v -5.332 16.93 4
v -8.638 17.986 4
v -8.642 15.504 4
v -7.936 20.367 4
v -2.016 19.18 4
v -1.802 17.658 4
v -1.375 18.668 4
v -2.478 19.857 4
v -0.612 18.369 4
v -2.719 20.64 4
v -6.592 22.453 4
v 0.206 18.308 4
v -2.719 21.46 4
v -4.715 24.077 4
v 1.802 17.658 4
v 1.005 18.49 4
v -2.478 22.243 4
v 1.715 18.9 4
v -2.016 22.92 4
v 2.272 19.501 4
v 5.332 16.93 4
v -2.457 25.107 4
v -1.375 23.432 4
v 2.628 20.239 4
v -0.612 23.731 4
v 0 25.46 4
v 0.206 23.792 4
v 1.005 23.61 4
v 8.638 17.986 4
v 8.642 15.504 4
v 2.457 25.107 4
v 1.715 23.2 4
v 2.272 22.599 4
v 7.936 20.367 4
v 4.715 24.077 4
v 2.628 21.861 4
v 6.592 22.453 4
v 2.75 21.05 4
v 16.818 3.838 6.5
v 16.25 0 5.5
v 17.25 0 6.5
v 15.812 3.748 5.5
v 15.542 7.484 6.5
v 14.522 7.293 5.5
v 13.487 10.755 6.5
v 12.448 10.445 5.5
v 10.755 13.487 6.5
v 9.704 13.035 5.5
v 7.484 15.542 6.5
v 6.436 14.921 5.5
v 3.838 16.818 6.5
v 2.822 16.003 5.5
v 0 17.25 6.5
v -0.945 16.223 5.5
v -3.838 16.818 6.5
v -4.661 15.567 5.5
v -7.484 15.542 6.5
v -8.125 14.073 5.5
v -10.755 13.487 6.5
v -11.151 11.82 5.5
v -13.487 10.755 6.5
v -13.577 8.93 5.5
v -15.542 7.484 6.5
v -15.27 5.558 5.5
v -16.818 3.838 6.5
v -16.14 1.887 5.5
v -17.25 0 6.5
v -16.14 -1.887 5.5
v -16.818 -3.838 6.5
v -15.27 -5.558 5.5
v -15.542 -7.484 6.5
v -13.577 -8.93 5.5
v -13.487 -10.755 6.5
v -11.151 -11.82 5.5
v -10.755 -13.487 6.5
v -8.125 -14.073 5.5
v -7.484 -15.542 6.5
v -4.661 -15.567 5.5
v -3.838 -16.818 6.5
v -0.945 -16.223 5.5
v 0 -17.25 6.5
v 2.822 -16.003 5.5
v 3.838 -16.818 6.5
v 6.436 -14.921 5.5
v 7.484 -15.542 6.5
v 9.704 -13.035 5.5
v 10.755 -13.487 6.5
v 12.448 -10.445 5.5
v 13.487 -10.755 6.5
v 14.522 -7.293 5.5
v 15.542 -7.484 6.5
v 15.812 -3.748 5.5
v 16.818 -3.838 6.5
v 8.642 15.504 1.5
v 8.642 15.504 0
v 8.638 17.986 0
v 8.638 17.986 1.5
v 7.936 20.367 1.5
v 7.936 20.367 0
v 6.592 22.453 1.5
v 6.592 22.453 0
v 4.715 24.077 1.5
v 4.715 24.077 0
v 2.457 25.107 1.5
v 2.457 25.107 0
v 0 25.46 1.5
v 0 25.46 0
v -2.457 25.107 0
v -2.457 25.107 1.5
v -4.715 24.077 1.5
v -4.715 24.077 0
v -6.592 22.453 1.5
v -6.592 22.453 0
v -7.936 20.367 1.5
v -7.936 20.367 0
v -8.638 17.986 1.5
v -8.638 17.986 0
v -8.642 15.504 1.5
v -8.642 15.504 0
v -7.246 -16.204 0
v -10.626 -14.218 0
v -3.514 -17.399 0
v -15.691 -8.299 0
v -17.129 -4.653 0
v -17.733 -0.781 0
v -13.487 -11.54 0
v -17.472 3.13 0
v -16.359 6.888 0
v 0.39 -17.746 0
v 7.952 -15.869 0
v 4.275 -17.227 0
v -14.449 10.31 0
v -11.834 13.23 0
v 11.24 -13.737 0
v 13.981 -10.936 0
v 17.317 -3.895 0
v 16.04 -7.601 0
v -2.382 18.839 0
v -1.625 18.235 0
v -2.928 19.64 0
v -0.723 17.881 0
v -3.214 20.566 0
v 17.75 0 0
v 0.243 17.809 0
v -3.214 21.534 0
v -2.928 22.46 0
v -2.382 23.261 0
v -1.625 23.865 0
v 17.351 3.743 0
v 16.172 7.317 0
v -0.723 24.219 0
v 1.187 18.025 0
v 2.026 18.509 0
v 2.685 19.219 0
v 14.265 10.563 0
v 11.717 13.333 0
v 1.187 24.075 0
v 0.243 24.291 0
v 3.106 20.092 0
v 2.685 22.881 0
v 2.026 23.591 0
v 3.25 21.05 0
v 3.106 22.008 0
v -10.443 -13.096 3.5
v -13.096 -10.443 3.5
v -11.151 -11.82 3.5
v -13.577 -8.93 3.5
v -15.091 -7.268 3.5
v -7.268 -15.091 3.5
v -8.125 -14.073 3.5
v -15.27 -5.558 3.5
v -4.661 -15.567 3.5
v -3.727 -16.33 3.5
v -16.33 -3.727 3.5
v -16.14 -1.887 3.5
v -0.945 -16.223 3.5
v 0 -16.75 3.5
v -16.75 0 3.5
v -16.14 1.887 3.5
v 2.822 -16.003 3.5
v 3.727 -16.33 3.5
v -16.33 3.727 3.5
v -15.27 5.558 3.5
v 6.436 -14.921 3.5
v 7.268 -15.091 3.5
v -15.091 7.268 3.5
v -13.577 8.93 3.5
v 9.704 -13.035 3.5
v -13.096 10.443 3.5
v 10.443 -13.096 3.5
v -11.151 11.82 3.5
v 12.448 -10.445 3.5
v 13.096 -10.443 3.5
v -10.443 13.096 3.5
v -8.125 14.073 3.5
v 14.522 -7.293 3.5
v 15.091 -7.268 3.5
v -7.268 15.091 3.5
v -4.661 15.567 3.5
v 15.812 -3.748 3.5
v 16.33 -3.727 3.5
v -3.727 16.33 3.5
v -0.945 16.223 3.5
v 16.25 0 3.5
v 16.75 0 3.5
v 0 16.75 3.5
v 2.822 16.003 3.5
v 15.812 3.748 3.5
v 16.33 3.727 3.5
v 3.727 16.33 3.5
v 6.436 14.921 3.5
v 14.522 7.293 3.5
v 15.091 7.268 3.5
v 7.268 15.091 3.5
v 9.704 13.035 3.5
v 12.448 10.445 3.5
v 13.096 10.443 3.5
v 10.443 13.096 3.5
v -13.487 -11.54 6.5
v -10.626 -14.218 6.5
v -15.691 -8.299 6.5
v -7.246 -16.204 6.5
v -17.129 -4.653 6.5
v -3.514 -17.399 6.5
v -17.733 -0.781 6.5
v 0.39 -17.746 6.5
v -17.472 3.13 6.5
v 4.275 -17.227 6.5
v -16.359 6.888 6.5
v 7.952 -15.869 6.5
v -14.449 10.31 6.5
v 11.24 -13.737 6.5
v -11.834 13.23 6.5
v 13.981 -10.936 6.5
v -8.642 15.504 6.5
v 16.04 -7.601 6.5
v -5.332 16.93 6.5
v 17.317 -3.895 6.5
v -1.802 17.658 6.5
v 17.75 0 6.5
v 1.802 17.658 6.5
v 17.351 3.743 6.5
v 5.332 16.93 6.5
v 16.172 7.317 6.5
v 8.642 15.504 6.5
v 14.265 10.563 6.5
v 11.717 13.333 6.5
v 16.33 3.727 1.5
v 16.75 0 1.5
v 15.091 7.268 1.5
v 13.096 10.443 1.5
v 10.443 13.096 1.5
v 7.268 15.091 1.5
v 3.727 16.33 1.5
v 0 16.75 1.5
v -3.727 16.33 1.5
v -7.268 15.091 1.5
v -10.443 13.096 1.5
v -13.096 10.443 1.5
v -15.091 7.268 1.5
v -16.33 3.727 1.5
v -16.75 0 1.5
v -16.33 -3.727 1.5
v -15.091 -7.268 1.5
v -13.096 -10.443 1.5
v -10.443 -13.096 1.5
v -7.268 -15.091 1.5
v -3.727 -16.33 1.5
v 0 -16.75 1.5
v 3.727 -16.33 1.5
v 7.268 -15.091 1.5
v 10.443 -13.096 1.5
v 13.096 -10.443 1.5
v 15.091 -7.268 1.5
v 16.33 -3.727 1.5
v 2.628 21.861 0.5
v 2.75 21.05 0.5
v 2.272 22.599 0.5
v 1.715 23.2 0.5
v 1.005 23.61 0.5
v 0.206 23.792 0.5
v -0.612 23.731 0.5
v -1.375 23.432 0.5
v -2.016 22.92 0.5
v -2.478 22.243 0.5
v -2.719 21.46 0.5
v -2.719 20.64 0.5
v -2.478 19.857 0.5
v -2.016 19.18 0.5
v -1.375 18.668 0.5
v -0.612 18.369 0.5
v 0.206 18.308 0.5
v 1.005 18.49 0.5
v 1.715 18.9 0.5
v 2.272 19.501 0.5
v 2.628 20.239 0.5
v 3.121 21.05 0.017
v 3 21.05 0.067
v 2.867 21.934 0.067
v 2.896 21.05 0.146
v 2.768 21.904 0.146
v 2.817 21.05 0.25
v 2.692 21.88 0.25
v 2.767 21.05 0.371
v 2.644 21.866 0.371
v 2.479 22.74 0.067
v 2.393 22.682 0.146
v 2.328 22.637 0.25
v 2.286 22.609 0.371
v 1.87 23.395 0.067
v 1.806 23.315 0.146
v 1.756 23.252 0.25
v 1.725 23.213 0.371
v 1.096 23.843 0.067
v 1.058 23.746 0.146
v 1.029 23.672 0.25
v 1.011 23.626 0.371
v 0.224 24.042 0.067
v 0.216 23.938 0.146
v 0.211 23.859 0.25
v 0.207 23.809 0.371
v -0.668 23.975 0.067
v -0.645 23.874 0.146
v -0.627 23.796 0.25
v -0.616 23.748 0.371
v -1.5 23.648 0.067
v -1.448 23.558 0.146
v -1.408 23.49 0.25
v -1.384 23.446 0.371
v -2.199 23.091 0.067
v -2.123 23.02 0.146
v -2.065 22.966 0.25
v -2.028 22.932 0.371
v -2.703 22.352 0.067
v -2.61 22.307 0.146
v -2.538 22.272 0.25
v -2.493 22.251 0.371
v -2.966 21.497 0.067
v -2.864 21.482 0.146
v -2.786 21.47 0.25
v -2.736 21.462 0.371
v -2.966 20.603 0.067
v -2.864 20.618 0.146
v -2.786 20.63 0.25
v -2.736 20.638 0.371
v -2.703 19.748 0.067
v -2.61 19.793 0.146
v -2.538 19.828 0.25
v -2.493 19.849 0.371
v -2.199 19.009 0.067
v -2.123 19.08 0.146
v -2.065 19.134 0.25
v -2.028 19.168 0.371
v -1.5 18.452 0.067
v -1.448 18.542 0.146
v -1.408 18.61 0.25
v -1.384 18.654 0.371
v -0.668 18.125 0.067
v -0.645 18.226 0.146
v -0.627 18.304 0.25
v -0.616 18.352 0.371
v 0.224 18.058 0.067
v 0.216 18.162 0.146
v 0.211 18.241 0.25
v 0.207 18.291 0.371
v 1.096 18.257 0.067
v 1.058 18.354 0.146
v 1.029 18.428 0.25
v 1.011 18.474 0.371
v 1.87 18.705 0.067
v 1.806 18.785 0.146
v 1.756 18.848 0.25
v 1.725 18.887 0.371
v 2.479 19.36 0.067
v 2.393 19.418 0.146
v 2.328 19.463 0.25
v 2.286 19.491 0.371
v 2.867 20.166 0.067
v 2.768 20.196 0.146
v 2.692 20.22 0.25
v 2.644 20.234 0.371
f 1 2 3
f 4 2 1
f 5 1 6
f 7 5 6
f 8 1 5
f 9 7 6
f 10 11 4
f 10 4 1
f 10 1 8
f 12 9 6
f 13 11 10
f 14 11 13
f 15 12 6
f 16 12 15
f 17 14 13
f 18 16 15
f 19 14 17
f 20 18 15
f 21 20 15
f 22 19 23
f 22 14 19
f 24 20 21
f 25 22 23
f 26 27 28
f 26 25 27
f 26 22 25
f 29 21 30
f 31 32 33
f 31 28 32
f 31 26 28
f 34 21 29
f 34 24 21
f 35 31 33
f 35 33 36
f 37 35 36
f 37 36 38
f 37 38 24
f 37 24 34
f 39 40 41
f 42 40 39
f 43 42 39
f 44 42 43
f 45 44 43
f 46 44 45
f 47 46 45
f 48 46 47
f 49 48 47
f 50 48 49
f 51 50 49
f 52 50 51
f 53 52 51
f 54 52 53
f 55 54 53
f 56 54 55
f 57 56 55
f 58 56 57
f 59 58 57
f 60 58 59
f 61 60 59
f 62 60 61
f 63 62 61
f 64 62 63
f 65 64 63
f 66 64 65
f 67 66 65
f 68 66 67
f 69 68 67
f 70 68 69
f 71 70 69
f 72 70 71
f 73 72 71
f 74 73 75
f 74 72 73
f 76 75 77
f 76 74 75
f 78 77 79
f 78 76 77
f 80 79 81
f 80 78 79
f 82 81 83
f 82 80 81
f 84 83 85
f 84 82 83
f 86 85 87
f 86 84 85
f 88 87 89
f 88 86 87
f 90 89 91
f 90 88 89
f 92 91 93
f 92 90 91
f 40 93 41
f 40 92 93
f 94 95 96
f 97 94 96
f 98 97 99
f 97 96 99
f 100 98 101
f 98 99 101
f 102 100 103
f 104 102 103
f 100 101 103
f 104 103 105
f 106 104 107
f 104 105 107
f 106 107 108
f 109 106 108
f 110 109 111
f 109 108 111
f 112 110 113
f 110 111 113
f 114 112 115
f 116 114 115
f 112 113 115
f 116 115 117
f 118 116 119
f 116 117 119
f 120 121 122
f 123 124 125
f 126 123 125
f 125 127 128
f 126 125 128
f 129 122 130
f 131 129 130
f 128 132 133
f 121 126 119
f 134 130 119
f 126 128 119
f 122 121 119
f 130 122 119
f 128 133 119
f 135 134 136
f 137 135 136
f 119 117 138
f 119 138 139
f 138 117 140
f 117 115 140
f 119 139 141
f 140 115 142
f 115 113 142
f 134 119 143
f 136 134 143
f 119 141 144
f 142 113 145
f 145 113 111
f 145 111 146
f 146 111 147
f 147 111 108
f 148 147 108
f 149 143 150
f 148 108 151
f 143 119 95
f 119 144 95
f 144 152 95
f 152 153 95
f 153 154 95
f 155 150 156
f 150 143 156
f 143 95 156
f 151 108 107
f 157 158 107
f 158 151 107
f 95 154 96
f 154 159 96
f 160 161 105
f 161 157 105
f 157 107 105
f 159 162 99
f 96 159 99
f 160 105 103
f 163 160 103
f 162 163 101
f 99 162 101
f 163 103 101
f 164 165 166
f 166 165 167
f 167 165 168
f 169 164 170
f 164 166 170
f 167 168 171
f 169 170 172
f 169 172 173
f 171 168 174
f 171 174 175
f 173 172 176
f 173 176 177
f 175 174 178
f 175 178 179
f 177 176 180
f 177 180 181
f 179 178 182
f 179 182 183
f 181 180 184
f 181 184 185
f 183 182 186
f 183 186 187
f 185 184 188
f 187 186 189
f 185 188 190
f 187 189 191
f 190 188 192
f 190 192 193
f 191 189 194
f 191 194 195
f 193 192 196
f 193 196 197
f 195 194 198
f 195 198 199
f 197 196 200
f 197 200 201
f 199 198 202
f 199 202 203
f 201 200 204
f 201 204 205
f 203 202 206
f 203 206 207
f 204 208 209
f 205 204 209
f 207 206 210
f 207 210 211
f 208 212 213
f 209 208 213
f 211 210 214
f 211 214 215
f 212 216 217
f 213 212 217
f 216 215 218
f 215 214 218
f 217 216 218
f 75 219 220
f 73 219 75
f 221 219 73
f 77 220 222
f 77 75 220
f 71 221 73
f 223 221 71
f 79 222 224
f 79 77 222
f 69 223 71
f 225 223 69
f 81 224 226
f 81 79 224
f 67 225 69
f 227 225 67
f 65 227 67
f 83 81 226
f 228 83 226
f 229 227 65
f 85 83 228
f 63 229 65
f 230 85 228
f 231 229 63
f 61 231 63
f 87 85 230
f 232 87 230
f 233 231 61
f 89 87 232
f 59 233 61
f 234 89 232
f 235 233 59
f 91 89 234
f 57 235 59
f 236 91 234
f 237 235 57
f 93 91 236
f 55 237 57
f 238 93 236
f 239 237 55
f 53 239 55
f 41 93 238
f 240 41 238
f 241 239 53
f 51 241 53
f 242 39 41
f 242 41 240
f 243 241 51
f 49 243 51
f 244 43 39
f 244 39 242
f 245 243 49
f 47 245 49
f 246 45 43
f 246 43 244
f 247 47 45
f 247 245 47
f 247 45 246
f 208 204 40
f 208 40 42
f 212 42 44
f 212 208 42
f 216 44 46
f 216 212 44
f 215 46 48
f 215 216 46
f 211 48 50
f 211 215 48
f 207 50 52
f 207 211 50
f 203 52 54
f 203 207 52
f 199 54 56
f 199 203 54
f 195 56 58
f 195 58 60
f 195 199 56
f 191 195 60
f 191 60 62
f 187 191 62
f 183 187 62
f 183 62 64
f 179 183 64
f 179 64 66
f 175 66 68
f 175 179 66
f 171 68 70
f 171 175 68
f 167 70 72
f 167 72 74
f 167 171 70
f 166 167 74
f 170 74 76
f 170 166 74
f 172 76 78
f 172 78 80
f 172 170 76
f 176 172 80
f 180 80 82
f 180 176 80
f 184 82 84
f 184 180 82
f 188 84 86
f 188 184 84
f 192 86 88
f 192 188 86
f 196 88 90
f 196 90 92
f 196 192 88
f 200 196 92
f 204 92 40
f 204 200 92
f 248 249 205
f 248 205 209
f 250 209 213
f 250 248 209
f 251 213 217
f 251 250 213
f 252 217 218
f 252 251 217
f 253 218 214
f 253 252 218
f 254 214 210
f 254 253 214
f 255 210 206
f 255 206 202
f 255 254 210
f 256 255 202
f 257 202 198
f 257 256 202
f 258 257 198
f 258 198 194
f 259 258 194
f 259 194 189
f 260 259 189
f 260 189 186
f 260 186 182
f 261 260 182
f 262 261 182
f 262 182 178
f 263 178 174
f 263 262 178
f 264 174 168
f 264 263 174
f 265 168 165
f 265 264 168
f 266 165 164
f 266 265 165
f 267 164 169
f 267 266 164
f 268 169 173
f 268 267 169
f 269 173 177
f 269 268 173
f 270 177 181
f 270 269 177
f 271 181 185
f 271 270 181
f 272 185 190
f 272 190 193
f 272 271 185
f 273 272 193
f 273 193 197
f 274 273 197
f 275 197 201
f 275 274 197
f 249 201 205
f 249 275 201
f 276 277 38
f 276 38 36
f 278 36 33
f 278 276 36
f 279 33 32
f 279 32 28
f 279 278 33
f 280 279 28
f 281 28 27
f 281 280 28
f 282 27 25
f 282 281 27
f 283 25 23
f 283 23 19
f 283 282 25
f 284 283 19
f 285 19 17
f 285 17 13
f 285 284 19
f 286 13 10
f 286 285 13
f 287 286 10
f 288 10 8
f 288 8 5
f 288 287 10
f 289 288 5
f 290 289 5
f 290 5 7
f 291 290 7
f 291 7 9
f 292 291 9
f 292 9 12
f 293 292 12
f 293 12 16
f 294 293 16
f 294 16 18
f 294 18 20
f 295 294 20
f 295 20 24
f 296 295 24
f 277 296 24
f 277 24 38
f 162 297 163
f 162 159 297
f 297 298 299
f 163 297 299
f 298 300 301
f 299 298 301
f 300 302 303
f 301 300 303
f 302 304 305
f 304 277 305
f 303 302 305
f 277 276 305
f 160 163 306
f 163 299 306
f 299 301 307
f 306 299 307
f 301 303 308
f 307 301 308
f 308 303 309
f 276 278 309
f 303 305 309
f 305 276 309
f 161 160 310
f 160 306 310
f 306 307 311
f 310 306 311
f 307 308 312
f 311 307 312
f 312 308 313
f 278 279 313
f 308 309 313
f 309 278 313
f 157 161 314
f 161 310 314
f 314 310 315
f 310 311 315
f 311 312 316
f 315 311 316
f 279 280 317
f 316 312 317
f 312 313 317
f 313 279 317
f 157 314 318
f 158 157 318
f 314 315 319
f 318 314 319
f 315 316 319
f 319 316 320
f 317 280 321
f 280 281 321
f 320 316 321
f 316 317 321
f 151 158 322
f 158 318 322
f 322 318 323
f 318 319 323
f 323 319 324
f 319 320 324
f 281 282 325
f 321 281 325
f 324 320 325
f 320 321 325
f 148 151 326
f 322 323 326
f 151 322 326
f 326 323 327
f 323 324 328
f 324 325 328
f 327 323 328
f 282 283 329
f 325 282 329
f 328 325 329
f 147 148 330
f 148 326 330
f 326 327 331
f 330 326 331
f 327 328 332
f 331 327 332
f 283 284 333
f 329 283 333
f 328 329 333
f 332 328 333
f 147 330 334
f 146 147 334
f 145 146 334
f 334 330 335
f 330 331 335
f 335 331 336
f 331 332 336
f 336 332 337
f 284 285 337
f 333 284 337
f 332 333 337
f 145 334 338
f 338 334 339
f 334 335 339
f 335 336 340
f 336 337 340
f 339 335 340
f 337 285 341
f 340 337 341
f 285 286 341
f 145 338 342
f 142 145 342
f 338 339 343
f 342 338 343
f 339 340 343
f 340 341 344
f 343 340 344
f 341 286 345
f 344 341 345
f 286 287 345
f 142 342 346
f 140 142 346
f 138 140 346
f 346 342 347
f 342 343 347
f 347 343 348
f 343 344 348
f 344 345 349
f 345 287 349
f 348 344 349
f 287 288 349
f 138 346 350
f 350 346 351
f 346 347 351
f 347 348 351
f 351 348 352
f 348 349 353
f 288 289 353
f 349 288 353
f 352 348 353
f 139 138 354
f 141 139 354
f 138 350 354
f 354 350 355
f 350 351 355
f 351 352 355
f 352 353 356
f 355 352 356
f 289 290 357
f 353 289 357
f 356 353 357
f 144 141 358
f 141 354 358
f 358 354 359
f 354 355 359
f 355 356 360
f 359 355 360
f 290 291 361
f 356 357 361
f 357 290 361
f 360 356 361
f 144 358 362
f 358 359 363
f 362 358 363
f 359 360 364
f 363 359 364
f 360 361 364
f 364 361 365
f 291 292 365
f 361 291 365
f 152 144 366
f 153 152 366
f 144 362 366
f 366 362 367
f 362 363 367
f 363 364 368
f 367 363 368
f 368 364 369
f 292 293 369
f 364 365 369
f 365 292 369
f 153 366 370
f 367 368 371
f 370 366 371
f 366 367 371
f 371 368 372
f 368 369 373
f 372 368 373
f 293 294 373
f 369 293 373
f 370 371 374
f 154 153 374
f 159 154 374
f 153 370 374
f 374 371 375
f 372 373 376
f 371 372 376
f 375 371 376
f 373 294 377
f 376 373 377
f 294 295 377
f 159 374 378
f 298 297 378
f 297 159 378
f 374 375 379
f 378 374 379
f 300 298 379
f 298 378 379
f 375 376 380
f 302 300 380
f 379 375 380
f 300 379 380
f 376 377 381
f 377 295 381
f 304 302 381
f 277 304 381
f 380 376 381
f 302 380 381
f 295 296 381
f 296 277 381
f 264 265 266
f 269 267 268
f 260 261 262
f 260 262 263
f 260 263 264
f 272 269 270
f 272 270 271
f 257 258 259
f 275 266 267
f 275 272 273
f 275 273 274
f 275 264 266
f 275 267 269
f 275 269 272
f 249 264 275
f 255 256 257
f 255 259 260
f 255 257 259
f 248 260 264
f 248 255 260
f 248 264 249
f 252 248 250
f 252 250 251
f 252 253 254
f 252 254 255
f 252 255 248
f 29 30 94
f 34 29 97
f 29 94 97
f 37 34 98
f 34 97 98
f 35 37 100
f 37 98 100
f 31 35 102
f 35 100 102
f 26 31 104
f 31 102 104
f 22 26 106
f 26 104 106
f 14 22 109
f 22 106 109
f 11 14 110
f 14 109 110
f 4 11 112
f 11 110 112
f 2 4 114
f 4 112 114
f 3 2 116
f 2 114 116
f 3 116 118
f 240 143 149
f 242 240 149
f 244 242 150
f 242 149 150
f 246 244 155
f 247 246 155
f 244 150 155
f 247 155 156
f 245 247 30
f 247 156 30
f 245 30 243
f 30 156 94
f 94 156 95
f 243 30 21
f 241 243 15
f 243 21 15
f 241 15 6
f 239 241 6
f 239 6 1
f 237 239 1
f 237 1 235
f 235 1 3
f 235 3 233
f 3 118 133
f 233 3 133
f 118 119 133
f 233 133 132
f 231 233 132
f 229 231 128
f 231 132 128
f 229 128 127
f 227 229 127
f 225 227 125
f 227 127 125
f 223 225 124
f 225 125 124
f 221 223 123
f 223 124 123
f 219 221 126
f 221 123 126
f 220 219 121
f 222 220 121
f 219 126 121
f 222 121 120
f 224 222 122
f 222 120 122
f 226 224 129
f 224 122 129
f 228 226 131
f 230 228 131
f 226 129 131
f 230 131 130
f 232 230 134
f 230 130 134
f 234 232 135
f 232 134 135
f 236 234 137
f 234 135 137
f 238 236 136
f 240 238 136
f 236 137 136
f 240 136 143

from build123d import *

# Parameters (mm, degrees)
F0_R     = 2.75
F1_DEPTH = 1.5
F2_R     = 16.75
F3_DEPTH = 2
F2_R_2   = 2.75
F5_DEPTH = 2.5
F6_R     = 16.75
F6_R_2   = 16.25
F7_DEPTH = 3
F8_SIZE  = 1
F9_R     = 0.5


# Not quite as in the source:
# - a feature names something its author has since deleted; it is built from what else it names


with BuildPart() as f1:
    # F0 (on Top) → F1 (new body)
    with BuildSketch(Plane.XY):
        with BuildLine():
            ThreePointArc((-8.6418314576, 15.5042332625), (-8.9908284276, -15.3044929412), (17.75, 0))
            ThreePointArc((17.75, 0), (15.3044929412, 8.9908284276), (8.6418314576, 15.5042332625))
            ThreePointArc((8.6418314576, 15.5042332625), (0, 17.75), (-8.6418314576, 15.5042332625))
        make_face()
        with BuildLine():
            ThreePointArc((-8.6418314576, 15.5042332625), (0, 17.75), (8.6418314576, 15.5042332625))
            ThreePointArc((8.6418314576, 15.5042332625), (6.5916833801, 22.4532341762), (0, 25.4601314234))
            ThreePointArc((0, 25.4601314234), (-6.5916833801, 22.4532341762), (-8.6418314576, 15.5042332625))
        make_face()
        with Locations((0, 21.05)):
            Circle(F0_R, mode=Mode.SUBTRACT)
    extrude(amount=F1_DEPTH)

    # F2 (on face) → F3 (join)
    with BuildSketch(Plane.XY.offset(1.5)):
        with BuildLine():
            ThreePointArc((-8.6418314576, 15.5042332625), (-8.9908284276, -15.3044929412), (17.75, 0))
            ThreePointArc((17.75, 0), (15.3044929412, 8.9908284276), (8.6418314576, 15.5042332625))
            ThreePointArc((8.6418314576, 15.5042332625), (0, 17.75), (-8.6418314576, 15.5042332625))
        make_face()
        Circle(F2_R, mode=Mode.SUBTRACT)
    extrude(amount=F3_DEPTH)

    # F2 (on face) → F5 (join)
    with BuildSketch(Plane.XY.offset(1.5)):
        with BuildLine():
            ThreePointArc((-8.6418314576, 15.5042332625), (0, 17.75), (8.6418314576, 15.5042332625))
            ThreePointArc((8.6418314576, 15.5042332625), (0, 25.4601314234), (-8.6418314576, 15.5042332625))
        make_face()
        with Locations((0, 21.05)):
            Circle(F2_R_2, mode=Mode.SUBTRACT)
    extrude(amount=F5_DEPTH)

    # F6 (on face) → F7 (join)
    with BuildSketch(Plane.XY.offset(3.5)):
        with BuildLine():
            ThreePointArc((-8.6418314576, 15.5042332625), (-8.9908284276, -15.3044929412), (17.75, 0))
            ThreePointArc((17.75, 0), (15.3044929412, 8.9908284276), (8.6418314576, 15.5042332625))
            ThreePointArc((8.6418314576, 15.5042332625), (0, 17.75), (-8.6418314576, 15.5042332625))
        make_face()
        Circle(F6_R, mode=Mode.SUBTRACT)
        Circle(F6_R)
        Circle(F6_R_2, mode=Mode.SUBTRACT)
    extrude(amount=F7_DEPTH)

    # F8
    f8_edges = [f1.edges().sort_by_distance(p)[0] for p in [
        (-16.25, 0, 6.5),
    ]]
    chamfer(f8_edges, length=F8_SIZE)

    # F9
    f9_edges = [f1.edges().sort_by_distance(p)[0] for p in [
        (-2.75, 21.05, 0),
    ]]
    fillet(f9_edges, radius=F9_R)


solid = f1.part
